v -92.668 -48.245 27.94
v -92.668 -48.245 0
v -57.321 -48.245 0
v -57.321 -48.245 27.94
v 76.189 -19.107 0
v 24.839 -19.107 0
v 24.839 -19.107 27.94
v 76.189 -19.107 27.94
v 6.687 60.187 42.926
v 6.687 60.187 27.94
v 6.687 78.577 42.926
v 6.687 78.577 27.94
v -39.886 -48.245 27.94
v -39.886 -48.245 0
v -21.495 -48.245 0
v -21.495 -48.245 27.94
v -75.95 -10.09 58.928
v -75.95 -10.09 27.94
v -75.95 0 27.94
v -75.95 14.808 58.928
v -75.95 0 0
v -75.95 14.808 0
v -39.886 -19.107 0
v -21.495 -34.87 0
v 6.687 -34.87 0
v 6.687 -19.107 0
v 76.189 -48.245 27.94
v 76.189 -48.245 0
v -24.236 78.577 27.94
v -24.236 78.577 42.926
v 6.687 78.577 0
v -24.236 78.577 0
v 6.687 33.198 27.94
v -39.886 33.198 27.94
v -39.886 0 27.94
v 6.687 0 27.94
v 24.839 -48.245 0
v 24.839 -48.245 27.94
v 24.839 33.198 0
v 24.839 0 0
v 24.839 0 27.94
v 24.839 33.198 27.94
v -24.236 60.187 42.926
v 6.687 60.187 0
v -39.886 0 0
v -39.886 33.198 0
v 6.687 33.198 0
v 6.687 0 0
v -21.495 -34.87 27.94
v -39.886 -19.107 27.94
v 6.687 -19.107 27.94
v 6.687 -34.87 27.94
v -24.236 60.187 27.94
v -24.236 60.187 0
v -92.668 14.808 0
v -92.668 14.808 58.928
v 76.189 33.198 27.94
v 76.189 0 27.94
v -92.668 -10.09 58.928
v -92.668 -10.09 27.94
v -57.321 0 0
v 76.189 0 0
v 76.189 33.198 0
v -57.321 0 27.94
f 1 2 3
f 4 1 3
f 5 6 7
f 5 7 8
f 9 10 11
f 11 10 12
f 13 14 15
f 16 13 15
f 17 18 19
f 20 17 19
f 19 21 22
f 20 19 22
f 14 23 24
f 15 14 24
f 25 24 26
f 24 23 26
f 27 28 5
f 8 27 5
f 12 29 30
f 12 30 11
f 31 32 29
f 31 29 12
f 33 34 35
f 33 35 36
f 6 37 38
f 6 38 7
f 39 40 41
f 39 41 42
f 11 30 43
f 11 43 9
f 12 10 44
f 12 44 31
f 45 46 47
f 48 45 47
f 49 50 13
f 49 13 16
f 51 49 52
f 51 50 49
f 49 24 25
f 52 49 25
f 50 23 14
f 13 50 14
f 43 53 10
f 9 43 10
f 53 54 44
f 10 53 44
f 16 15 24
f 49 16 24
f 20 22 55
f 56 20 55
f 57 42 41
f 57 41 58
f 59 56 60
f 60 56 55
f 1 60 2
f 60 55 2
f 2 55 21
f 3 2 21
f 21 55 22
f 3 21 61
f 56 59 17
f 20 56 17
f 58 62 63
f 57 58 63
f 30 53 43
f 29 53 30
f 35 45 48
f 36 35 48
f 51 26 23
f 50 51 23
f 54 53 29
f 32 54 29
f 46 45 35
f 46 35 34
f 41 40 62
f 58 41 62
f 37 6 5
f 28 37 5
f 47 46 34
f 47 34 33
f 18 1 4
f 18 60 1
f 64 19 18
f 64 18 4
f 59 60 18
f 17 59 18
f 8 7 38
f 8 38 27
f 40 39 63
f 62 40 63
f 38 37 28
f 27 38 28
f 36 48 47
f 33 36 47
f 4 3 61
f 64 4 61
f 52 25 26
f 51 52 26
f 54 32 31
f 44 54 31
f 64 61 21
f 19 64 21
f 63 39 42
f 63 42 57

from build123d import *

# Parameters (mm, degrees)
F0_W      = 51.349696
F0_H      = 33.198178
F1_DEPTH  = 20.32
F0_H_2    = 29.137973
F0_W_2    = 46.572987
F0_W_3    = 30.923551
F0_H_3    = 18.390361
F2_DEPTH  = 27.94
F4_DEPTH  = 30.988
F2_FACE_W = 30.923552
F2_FACE_H = 18.390361
F5_DEPTH  = 14.986


with BuildPart() as f1:
    # F0 (on Top) → F1 (new body)
    with BuildSketch(Plane.XY):
        with Locations((50.513776, 16.599089)):
            Rectangle(F0_W, F0_H)
    extrude(amount=F1_DEPTH)

    # F0 (on Top) → F2 (join)
    with BuildSketch(Plane.XY):
        with Locations((50.513776, 16.599089)):
            Rectangle(F0_W, F0_H)
        with Locations((50.513776, -33.675851)):
            Rectangle(F0_W, F0_H_2)
        with Locations((-16.599091, 16.599089)):
            Rectangle(F0_W_2, F0_H)
        Polygon((6.687403, -34.870032), (6.687403, -19.106865), (-39.885584, -19.106865), (-39.885584, -48.244838), (-21.495223, -48.244838), (-21.495223, -34.870032), align=None)
        Polygon((-57.320599, -48.244838), (-57.320599, 0), (-75.949796, 0), (-75.949796, -9.075762), (-92.668295, -9.075762), (-92.668295, -48.244838), align=None)
        Polygon((-75.949796, -9.075762), (-75.949796, 0), (-75.949796, 14.807821), (-92.668295, 14.807821), (-92.668295, -9.075762), align=None)
        with Locations((-8.774373, 69.381809)):
            Rectangle(F0_W_3, F0_H_3)
    extrude(amount=F2_DEPTH)

    # F3 (on face) → F4 (join)
    with BuildSketch(Plane.XY.offset(27.94)):
        Polygon((-75.949796, 14.807821), (-92.668295, 14.807821), (-92.668295, -10.090123), (-75.949796, -10.090123), (-75.949796, 0), align=None)
    extrude(amount=F4_DEPTH)

    # F2_face (on face) → F5 (join)
    with BuildSketch(Plane(origin=(-76.175231, -20.125917, 27.94), x_dir=(1, 0, 0), z_dir=(0, 0, 1))):
        with Locations((67.400859, 89.507726)):
            Rectangle(F2_FACE_W, F2_FACE_H)
    extrude(amount=F5_DEPTH)


solid = f1.part
